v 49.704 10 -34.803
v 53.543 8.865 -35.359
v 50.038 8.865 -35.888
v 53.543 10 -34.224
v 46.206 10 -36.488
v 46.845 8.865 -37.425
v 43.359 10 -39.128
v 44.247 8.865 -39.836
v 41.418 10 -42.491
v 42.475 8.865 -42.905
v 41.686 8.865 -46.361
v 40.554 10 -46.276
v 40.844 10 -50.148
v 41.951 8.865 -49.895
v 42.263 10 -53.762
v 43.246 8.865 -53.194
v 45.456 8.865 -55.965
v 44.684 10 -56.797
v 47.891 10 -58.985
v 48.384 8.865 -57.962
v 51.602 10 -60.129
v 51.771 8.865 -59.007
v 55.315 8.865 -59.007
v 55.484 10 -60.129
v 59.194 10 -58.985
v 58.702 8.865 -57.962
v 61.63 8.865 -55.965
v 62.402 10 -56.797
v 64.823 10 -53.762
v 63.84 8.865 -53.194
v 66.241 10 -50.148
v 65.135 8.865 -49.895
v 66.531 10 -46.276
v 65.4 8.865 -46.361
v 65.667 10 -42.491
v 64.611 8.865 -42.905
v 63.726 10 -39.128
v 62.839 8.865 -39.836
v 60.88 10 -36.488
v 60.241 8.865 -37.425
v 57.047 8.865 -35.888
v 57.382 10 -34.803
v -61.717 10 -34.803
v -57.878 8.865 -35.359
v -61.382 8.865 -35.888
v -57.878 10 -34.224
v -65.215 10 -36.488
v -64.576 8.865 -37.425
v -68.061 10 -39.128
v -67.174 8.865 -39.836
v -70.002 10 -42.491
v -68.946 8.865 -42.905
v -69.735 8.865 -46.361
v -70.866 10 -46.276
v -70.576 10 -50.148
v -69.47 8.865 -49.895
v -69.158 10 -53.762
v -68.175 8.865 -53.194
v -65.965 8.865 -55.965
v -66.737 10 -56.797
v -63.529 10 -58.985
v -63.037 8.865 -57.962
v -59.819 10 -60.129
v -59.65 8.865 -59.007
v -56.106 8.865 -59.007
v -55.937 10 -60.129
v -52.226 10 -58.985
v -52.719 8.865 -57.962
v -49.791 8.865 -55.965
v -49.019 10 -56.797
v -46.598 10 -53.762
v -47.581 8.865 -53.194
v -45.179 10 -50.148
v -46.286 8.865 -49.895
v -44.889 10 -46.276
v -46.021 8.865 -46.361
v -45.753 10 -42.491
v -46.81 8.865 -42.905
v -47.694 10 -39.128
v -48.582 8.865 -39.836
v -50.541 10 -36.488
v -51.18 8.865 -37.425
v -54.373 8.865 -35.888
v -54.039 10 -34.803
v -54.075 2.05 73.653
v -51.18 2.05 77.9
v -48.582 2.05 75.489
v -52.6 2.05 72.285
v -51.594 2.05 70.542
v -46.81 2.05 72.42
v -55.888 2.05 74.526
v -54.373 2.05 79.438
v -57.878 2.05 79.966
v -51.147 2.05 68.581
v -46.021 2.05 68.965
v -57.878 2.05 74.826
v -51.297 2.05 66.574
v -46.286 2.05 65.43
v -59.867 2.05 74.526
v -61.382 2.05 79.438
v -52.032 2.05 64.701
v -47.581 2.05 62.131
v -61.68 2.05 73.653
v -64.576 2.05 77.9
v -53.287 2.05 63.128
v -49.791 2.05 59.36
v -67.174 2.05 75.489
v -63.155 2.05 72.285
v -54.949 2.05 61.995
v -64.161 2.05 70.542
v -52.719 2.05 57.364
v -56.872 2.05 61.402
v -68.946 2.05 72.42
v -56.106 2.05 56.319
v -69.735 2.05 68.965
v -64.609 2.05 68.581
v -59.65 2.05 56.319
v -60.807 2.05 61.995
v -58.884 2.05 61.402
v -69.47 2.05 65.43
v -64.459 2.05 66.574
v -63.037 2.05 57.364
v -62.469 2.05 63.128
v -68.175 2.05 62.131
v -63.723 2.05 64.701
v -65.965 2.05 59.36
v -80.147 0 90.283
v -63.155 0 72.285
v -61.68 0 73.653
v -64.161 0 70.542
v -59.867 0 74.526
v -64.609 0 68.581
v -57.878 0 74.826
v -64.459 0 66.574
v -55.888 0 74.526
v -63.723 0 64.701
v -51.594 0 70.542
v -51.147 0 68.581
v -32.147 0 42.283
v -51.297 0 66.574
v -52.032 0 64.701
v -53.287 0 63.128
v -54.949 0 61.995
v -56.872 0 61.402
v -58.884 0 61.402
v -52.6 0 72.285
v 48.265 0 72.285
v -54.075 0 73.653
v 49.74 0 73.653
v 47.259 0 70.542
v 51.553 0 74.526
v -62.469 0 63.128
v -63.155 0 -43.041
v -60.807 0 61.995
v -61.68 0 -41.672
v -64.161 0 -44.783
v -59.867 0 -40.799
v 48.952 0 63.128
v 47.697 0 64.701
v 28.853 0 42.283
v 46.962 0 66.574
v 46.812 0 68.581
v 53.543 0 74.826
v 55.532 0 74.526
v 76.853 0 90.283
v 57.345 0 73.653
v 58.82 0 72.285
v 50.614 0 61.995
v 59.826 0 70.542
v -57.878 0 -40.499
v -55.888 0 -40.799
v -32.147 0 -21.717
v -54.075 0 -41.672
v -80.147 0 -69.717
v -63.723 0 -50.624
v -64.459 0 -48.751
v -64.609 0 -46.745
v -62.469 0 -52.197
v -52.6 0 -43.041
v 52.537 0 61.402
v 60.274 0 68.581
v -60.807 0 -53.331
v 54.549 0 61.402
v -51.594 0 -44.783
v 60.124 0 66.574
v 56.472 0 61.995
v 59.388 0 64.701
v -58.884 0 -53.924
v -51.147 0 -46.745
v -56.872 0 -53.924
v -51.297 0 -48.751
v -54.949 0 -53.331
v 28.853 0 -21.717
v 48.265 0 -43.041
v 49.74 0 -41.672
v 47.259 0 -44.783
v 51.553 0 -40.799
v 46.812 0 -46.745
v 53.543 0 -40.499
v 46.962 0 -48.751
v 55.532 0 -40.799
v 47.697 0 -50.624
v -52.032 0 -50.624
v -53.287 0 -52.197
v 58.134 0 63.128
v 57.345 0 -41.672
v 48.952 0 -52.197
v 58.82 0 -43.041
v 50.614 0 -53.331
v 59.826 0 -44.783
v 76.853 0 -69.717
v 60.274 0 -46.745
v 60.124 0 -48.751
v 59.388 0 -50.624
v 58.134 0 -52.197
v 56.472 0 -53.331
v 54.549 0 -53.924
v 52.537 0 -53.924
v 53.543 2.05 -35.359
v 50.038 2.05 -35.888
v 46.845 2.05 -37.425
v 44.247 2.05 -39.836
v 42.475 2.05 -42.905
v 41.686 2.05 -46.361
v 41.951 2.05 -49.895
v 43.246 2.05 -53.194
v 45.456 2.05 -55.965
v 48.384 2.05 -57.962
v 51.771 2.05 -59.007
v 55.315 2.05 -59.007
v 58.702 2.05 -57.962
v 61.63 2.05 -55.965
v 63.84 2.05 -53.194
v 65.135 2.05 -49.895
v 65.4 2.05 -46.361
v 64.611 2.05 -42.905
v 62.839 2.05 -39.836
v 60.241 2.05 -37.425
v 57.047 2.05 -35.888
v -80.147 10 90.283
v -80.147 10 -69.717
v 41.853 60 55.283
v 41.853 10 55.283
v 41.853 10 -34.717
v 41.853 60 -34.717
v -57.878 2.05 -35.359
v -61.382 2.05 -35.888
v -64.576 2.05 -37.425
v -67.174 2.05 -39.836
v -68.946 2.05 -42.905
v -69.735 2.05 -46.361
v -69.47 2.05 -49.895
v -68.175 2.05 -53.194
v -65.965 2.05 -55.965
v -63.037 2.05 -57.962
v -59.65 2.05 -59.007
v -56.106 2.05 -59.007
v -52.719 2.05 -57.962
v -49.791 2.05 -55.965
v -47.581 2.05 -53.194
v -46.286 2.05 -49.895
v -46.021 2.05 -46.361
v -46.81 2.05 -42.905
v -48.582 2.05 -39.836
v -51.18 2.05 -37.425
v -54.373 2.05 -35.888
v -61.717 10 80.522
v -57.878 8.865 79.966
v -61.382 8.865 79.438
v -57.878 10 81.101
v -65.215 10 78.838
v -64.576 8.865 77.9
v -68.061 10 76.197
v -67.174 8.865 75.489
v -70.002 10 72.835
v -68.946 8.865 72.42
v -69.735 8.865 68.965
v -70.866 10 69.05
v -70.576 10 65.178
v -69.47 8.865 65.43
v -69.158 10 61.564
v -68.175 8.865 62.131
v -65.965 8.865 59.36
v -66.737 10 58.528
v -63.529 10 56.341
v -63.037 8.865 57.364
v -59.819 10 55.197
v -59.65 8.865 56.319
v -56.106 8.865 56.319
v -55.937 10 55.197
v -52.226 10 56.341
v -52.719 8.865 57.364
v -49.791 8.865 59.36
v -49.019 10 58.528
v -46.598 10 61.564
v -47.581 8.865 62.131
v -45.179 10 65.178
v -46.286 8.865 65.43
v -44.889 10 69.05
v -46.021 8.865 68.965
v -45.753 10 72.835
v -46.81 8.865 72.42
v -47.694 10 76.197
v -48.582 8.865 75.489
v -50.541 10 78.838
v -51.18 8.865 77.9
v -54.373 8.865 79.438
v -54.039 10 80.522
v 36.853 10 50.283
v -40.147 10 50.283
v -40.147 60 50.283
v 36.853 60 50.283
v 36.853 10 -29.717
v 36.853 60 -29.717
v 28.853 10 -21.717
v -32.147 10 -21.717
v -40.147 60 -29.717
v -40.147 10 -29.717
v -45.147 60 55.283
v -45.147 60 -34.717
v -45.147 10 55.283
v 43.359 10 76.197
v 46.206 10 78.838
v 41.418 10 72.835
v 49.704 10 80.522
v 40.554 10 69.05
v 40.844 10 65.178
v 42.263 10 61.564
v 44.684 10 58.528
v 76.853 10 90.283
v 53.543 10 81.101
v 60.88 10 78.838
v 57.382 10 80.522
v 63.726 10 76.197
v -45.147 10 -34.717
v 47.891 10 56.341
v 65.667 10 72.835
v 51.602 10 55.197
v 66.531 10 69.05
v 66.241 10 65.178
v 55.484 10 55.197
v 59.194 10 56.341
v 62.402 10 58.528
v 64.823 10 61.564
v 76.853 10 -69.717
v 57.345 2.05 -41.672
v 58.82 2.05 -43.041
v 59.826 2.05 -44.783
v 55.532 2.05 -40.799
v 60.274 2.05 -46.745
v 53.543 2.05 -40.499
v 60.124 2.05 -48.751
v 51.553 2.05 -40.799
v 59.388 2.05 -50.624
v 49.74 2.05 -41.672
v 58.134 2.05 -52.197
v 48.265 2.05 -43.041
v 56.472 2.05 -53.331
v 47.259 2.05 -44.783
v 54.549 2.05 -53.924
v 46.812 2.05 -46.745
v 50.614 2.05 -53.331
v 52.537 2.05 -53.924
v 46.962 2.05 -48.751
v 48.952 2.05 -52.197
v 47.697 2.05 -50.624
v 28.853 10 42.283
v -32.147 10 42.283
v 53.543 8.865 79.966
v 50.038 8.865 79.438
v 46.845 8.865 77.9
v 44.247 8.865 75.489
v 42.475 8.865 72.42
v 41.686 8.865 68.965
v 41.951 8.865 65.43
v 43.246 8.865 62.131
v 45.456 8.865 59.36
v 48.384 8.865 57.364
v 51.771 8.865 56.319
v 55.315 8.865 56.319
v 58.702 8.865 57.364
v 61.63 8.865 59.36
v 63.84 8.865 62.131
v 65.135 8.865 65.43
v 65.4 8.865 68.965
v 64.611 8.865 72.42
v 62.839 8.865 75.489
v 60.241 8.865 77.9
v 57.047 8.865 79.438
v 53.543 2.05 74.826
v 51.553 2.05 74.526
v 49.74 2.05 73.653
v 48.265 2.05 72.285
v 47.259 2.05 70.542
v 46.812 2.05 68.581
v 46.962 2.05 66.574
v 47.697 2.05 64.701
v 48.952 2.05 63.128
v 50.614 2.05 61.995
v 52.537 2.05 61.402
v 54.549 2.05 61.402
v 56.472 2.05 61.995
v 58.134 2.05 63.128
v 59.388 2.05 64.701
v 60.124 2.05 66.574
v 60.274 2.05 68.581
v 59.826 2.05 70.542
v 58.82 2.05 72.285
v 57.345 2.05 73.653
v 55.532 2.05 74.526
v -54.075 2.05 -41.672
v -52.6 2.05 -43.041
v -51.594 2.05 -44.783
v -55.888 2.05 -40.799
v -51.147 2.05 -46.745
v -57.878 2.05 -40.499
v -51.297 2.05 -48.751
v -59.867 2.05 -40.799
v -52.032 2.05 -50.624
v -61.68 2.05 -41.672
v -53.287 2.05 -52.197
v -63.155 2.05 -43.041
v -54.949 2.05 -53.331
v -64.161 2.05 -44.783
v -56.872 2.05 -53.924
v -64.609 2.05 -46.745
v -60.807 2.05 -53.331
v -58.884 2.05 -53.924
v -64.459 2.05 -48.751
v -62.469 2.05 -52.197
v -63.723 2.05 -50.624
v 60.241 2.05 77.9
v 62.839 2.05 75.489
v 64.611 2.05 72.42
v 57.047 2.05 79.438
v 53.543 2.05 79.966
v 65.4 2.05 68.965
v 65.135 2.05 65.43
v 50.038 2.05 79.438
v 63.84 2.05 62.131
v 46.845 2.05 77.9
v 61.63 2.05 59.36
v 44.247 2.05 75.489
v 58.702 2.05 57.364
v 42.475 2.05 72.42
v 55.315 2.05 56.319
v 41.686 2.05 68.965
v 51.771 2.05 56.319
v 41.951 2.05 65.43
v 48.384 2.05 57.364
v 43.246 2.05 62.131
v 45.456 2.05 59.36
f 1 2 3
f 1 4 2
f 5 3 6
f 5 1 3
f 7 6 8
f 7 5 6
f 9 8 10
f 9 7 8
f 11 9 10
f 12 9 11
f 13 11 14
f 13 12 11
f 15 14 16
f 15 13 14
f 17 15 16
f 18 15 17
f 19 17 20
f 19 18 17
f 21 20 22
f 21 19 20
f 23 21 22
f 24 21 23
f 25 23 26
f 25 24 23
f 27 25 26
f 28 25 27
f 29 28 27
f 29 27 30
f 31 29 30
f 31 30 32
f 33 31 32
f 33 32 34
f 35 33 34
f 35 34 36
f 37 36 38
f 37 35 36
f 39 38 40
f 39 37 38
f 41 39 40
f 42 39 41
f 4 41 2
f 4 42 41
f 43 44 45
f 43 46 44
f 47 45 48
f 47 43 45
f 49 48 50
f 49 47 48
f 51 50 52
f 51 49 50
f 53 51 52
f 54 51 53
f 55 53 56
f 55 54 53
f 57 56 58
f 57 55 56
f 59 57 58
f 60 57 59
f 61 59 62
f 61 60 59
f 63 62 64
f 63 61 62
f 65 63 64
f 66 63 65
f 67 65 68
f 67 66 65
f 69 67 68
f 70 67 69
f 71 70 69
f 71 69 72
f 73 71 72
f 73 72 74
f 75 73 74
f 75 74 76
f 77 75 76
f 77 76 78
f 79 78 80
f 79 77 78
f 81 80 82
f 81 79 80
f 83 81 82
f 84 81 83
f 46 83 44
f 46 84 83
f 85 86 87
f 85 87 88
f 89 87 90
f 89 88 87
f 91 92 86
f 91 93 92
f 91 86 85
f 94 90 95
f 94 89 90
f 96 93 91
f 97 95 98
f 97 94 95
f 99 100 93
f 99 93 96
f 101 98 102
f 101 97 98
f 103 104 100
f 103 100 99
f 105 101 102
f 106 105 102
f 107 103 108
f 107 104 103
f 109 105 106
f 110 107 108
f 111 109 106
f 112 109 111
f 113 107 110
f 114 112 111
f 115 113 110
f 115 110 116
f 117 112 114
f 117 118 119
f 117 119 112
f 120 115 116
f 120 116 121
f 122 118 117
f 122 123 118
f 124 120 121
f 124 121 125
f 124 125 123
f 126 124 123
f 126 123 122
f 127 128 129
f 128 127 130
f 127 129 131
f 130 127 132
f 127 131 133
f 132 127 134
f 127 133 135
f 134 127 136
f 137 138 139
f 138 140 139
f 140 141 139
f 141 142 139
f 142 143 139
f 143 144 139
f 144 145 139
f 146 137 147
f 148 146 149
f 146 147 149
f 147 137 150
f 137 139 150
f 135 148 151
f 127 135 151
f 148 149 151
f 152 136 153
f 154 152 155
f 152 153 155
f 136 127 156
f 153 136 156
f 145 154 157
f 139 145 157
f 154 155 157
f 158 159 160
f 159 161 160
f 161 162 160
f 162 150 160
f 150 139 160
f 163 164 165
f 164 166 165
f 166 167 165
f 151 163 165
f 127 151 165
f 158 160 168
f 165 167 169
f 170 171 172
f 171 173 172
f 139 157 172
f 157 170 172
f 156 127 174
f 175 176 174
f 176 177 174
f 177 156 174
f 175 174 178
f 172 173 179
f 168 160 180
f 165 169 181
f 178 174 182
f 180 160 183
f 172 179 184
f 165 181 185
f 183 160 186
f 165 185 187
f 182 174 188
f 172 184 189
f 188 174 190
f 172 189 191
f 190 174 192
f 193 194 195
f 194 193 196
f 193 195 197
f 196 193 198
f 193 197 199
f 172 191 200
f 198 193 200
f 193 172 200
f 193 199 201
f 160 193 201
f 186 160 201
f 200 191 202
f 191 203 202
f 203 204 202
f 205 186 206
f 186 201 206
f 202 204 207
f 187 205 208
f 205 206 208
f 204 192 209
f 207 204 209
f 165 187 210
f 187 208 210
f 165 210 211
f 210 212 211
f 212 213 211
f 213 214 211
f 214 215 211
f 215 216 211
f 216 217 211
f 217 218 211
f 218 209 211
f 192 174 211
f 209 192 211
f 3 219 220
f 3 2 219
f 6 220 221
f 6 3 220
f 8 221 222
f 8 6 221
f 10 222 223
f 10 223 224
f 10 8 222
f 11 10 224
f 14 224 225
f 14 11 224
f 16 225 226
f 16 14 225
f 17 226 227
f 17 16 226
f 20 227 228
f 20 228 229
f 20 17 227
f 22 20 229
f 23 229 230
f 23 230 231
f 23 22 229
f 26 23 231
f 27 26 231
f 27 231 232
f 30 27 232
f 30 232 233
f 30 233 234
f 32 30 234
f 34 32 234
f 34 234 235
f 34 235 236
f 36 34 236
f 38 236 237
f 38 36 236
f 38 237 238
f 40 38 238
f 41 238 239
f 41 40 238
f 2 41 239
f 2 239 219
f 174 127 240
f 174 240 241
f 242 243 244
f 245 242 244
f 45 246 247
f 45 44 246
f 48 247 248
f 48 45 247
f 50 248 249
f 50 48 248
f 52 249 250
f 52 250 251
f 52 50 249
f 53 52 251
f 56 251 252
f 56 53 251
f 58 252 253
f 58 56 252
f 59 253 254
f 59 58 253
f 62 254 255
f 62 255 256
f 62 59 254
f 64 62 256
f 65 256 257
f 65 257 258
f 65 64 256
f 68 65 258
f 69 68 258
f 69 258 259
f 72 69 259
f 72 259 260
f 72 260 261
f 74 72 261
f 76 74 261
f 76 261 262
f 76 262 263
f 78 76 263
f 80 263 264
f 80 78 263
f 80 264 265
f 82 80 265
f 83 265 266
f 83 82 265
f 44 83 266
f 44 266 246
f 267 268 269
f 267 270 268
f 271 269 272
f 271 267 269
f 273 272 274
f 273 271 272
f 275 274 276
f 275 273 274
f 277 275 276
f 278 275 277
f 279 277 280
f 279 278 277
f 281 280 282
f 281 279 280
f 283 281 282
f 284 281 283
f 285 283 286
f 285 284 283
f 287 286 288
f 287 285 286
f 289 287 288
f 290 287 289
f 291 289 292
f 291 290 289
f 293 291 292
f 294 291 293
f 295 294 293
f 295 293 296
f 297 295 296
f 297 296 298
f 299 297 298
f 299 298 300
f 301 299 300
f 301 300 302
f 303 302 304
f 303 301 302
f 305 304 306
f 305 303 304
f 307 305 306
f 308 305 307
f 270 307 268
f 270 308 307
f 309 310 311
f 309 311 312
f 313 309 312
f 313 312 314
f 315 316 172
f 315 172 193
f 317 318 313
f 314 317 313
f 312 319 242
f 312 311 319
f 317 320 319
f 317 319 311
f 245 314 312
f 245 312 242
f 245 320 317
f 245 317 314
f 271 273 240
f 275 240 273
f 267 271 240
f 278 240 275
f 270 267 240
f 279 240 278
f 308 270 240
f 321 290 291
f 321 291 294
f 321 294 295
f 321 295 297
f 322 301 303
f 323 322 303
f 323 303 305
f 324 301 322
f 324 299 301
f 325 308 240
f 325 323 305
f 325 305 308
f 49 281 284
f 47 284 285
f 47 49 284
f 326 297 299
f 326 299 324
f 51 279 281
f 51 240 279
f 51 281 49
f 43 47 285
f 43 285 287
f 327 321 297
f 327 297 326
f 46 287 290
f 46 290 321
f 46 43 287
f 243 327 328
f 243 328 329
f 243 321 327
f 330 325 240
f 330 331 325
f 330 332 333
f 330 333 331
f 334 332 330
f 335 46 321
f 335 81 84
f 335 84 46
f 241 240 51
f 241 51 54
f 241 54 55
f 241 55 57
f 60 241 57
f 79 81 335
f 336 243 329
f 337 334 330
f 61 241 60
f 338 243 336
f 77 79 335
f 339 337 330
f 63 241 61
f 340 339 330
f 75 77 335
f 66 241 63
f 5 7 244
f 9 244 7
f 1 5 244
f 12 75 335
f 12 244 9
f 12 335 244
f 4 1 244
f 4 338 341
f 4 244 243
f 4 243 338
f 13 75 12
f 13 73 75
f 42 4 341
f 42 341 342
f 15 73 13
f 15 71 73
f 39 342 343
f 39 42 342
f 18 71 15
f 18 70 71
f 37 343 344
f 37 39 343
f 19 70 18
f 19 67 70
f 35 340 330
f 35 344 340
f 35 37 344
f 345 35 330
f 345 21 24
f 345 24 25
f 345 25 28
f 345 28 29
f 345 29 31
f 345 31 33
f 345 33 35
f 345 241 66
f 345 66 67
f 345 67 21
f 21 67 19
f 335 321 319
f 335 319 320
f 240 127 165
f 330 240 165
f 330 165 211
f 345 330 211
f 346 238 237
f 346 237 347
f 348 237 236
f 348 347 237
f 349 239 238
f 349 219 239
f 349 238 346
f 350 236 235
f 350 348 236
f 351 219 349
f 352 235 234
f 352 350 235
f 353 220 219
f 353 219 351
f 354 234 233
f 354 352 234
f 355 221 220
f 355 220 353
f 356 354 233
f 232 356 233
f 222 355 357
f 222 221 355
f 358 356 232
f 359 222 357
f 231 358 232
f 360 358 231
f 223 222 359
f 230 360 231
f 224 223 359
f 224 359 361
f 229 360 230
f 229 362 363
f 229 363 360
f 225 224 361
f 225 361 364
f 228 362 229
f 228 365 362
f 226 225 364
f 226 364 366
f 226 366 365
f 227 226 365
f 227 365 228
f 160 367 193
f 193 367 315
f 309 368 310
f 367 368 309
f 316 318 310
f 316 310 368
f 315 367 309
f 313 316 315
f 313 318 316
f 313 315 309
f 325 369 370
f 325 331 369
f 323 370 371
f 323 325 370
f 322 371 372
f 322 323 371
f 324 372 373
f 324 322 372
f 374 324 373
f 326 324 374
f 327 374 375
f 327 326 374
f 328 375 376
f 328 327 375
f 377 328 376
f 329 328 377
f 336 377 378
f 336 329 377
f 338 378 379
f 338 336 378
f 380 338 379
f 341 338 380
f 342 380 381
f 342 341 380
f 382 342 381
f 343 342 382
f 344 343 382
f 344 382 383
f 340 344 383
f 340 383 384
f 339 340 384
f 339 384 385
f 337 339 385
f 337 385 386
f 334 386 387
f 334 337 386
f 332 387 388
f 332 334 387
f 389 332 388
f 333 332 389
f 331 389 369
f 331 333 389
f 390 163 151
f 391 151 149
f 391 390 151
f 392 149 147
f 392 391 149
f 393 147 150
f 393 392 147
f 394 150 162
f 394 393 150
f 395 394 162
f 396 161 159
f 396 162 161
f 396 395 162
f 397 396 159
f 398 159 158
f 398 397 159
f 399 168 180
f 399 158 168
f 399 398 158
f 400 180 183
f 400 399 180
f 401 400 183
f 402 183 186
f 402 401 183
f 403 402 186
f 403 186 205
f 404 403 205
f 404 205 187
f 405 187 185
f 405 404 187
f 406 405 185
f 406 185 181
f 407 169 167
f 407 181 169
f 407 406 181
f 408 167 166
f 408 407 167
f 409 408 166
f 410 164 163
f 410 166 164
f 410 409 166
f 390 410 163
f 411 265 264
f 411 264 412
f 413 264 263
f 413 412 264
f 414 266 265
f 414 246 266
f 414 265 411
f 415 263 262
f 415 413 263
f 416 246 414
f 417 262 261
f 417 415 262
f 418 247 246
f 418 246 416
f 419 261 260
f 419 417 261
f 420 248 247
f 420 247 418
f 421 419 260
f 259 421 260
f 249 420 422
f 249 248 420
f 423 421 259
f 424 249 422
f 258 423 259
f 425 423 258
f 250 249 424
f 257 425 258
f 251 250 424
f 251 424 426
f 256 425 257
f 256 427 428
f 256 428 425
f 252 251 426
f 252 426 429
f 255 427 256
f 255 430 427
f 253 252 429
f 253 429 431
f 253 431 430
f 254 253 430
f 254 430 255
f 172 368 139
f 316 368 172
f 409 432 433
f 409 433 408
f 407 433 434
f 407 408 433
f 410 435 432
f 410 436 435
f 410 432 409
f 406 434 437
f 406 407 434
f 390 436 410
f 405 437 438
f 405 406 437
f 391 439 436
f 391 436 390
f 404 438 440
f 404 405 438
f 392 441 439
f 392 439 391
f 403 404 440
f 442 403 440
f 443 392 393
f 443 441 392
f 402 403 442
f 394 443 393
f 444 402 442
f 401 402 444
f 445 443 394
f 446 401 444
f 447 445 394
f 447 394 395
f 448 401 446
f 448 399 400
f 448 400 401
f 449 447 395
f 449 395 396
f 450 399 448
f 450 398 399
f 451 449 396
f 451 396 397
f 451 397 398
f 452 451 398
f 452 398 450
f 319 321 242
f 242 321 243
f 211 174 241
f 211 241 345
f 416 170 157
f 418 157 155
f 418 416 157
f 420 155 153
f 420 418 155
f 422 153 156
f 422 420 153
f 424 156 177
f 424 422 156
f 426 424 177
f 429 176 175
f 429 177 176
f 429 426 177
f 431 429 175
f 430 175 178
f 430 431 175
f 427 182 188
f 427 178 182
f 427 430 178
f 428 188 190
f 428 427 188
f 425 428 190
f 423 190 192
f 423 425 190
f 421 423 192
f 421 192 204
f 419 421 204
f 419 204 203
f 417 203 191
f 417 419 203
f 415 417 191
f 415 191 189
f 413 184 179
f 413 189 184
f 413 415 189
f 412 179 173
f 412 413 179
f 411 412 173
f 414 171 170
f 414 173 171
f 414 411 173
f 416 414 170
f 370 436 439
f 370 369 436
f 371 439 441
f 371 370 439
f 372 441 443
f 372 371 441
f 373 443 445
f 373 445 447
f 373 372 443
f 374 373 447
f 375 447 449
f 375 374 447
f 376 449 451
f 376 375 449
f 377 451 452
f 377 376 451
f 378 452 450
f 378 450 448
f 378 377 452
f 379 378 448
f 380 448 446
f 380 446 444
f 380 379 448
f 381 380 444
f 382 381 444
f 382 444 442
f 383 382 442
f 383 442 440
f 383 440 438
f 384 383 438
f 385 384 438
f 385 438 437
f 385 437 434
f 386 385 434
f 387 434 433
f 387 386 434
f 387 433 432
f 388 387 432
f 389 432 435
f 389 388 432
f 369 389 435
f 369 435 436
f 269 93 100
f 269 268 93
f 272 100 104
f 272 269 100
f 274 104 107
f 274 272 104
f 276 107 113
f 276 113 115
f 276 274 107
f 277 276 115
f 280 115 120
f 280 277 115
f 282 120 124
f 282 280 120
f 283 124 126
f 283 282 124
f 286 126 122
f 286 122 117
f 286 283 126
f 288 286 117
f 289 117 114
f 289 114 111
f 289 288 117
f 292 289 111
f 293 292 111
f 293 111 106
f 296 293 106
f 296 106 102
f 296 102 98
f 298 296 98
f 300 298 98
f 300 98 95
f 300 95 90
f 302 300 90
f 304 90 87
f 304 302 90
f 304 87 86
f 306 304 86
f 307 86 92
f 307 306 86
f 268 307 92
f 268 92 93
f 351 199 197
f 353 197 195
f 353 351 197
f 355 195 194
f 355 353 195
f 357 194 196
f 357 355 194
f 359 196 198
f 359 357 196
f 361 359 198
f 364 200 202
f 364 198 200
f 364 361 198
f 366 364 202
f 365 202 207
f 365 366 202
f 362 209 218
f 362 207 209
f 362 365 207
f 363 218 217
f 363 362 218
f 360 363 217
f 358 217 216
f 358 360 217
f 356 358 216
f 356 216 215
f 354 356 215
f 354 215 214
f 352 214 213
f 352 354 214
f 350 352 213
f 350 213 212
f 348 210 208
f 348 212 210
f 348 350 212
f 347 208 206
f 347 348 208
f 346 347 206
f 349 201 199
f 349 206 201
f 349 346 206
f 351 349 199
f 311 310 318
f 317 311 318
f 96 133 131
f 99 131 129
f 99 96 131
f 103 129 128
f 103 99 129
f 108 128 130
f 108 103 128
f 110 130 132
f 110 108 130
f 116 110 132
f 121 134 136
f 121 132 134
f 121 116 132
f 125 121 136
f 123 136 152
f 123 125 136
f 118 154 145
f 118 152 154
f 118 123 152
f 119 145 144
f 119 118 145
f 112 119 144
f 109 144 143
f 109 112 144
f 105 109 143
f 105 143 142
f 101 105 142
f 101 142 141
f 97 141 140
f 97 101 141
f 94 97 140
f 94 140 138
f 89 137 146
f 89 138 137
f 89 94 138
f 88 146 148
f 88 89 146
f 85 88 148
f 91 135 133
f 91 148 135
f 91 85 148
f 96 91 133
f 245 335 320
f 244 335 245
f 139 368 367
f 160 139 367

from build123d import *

# Parameters (mm, degrees)
SKETCH1_W                                    = 157
SKETCH1_H                                    = 160
BOSS_EXTRUDE1_DEPTH                          = 10
SKETCH2_W                                    = 61
SKETCH2_H                                    = 64
CUT_EXTRUDE1_DEPTH                           = 10
CBORE_SLOT_FOR_M12_HEX_HEAD_BOLT1_AT_2_COUNT = 2
CBORE_SLOT_FOR_M12_HEX_HEAD_BOLT1_AT_2_PITCH = 111.420621054
CBORE_SLOT_FOR_M12_HEX_HEAD_BOLT1_AT_3_COUNT = 2
CBORE_SLOT_FOR_M12_HEX_HEAD_BOLT1_AT_3_PITCH = 160.357529077
CBORE_SLOT_FOR_M12_HEX_HEAD_BOLT1_AT_4_COUNT = 2
CBORE_SLOT_FOR_M12_HEX_HEAD_BOLT1_AT_4_PITCH = 115.325549362
SKETCH7_W                                    = 87
SKETCH7_H                                    = 90
SKETCH7_W_2                                  = 77
SKETCH7_H_2                                  = 80
EXTRUDE_THIN1_DEPTH                          = 50


with BuildPart() as part:
    # Sketch1 → Boss-Extrude1 (new body)
    with BuildSketch(Plane(origin=(0, 0, 0), x_dir=(1, 0, 0), z_dir=(0, 1, 0))):
        with Locations((-1.646853147, -10.283216783)):
            Rectangle(SKETCH1_W, SKETCH1_H)
    extrude(amount=BOSS_EXTRUDE1_DEPTH)

    # Sketch2 → Cut-Extrude1 (cut)
    with BuildSketch(Plane(origin=(0, 10, 0), x_dir=(1, 0, 0), z_dir=(0, 1, 0))):
        with Locations((-1.646853147, -10.283216783)):
            Rectangle(SKETCH2_W, SKETCH2_H)
    extrude(amount=-CUT_EXTRUDE1_DEPTH, mode=Mode.SUBTRACT)

    # Sketch4 → CBORE SLOT for M12 Hex Head Bolt1 (revolve, cut)
    with BuildSketch(Plane(origin=(-57.877820781, 10, -47.249393621), x_dir=(0, 0, 1), z_dir=(1, 0, 0))):
        Polygon((0, 0), (0, 22.055809178), (6.75, 18), (6.75, 7.95), (11.89, 7.95), (11.89, 1.135), (13.025, 0), align=None)
    cbore_slot_for_m12_hex_head_bolt1 = revolve(axis=Axis((-57.877820781, 16.35, -47.249393621), (0, -1, 0)), mode=Mode.SUBTRACT)

    # CBORE SLOT for M12 Hex Head Bolt1 at 2: CBORE SLOT for M12 Hex Head Bolt1 ×2
    with Locations(*[(i * CBORE_SLOT_FOR_M12_HEX_HEAD_BOLT1_AT_2_PITCH, 0, 0) for i in range(1, CBORE_SLOT_FOR_M12_HEX_HEAD_BOLT1_AT_2_COUNT)]):
        add(cbore_slot_for_m12_hex_head_bolt1, mode=Mode.SUBTRACT)

    # CBORE SLOT for M12 Hex Head Bolt1 at 3: CBORE SLOT for M12 Hex Head Bolt1 ×2
    with Locations(*[Vector(0.6948262529067781, 0, 0.7191776402750062) * (i * CBORE_SLOT_FOR_M12_HEX_HEAD_BOLT1_AT_3_PITCH) for i in range(1, CBORE_SLOT_FOR_M12_HEX_HEAD_BOLT1_AT_3_COUNT)]):
        add(cbore_slot_for_m12_hex_head_bolt1, mode=Mode.SUBTRACT)

    # CBORE SLOT for M12 Hex Head Bolt1 at 4: CBORE SLOT for M12 Hex Head Bolt1 ×2
    with Locations(*[(0, 0, i * CBORE_SLOT_FOR_M12_HEX_HEAD_BOLT1_AT_4_PITCH) for i in range(1, CBORE_SLOT_FOR_M12_HEX_HEAD_BOLT1_AT_4_COUNT)]):
        add(cbore_slot_for_m12_hex_head_bolt1, mode=Mode.SUBTRACT)

    # Sketch7 → Extrude-Thin1 (add)
    with BuildSketch(Plane(origin=(0, 10, 0), x_dir=(1, 0, 0), z_dir=(0, 1, 0))):
        with Locations((-1.646853147, -10.283216783)):
            Rectangle(SKETCH7_W, SKETCH7_H)
        with Locations((-1.646853147, -10.283216783)):
            Rectangle(SKETCH7_W_2, SKETCH7_H_2, mode=Mode.SUBTRACT)
    extrude(amount=EXTRUDE_THIN1_DEPTH)


solid = part.part
